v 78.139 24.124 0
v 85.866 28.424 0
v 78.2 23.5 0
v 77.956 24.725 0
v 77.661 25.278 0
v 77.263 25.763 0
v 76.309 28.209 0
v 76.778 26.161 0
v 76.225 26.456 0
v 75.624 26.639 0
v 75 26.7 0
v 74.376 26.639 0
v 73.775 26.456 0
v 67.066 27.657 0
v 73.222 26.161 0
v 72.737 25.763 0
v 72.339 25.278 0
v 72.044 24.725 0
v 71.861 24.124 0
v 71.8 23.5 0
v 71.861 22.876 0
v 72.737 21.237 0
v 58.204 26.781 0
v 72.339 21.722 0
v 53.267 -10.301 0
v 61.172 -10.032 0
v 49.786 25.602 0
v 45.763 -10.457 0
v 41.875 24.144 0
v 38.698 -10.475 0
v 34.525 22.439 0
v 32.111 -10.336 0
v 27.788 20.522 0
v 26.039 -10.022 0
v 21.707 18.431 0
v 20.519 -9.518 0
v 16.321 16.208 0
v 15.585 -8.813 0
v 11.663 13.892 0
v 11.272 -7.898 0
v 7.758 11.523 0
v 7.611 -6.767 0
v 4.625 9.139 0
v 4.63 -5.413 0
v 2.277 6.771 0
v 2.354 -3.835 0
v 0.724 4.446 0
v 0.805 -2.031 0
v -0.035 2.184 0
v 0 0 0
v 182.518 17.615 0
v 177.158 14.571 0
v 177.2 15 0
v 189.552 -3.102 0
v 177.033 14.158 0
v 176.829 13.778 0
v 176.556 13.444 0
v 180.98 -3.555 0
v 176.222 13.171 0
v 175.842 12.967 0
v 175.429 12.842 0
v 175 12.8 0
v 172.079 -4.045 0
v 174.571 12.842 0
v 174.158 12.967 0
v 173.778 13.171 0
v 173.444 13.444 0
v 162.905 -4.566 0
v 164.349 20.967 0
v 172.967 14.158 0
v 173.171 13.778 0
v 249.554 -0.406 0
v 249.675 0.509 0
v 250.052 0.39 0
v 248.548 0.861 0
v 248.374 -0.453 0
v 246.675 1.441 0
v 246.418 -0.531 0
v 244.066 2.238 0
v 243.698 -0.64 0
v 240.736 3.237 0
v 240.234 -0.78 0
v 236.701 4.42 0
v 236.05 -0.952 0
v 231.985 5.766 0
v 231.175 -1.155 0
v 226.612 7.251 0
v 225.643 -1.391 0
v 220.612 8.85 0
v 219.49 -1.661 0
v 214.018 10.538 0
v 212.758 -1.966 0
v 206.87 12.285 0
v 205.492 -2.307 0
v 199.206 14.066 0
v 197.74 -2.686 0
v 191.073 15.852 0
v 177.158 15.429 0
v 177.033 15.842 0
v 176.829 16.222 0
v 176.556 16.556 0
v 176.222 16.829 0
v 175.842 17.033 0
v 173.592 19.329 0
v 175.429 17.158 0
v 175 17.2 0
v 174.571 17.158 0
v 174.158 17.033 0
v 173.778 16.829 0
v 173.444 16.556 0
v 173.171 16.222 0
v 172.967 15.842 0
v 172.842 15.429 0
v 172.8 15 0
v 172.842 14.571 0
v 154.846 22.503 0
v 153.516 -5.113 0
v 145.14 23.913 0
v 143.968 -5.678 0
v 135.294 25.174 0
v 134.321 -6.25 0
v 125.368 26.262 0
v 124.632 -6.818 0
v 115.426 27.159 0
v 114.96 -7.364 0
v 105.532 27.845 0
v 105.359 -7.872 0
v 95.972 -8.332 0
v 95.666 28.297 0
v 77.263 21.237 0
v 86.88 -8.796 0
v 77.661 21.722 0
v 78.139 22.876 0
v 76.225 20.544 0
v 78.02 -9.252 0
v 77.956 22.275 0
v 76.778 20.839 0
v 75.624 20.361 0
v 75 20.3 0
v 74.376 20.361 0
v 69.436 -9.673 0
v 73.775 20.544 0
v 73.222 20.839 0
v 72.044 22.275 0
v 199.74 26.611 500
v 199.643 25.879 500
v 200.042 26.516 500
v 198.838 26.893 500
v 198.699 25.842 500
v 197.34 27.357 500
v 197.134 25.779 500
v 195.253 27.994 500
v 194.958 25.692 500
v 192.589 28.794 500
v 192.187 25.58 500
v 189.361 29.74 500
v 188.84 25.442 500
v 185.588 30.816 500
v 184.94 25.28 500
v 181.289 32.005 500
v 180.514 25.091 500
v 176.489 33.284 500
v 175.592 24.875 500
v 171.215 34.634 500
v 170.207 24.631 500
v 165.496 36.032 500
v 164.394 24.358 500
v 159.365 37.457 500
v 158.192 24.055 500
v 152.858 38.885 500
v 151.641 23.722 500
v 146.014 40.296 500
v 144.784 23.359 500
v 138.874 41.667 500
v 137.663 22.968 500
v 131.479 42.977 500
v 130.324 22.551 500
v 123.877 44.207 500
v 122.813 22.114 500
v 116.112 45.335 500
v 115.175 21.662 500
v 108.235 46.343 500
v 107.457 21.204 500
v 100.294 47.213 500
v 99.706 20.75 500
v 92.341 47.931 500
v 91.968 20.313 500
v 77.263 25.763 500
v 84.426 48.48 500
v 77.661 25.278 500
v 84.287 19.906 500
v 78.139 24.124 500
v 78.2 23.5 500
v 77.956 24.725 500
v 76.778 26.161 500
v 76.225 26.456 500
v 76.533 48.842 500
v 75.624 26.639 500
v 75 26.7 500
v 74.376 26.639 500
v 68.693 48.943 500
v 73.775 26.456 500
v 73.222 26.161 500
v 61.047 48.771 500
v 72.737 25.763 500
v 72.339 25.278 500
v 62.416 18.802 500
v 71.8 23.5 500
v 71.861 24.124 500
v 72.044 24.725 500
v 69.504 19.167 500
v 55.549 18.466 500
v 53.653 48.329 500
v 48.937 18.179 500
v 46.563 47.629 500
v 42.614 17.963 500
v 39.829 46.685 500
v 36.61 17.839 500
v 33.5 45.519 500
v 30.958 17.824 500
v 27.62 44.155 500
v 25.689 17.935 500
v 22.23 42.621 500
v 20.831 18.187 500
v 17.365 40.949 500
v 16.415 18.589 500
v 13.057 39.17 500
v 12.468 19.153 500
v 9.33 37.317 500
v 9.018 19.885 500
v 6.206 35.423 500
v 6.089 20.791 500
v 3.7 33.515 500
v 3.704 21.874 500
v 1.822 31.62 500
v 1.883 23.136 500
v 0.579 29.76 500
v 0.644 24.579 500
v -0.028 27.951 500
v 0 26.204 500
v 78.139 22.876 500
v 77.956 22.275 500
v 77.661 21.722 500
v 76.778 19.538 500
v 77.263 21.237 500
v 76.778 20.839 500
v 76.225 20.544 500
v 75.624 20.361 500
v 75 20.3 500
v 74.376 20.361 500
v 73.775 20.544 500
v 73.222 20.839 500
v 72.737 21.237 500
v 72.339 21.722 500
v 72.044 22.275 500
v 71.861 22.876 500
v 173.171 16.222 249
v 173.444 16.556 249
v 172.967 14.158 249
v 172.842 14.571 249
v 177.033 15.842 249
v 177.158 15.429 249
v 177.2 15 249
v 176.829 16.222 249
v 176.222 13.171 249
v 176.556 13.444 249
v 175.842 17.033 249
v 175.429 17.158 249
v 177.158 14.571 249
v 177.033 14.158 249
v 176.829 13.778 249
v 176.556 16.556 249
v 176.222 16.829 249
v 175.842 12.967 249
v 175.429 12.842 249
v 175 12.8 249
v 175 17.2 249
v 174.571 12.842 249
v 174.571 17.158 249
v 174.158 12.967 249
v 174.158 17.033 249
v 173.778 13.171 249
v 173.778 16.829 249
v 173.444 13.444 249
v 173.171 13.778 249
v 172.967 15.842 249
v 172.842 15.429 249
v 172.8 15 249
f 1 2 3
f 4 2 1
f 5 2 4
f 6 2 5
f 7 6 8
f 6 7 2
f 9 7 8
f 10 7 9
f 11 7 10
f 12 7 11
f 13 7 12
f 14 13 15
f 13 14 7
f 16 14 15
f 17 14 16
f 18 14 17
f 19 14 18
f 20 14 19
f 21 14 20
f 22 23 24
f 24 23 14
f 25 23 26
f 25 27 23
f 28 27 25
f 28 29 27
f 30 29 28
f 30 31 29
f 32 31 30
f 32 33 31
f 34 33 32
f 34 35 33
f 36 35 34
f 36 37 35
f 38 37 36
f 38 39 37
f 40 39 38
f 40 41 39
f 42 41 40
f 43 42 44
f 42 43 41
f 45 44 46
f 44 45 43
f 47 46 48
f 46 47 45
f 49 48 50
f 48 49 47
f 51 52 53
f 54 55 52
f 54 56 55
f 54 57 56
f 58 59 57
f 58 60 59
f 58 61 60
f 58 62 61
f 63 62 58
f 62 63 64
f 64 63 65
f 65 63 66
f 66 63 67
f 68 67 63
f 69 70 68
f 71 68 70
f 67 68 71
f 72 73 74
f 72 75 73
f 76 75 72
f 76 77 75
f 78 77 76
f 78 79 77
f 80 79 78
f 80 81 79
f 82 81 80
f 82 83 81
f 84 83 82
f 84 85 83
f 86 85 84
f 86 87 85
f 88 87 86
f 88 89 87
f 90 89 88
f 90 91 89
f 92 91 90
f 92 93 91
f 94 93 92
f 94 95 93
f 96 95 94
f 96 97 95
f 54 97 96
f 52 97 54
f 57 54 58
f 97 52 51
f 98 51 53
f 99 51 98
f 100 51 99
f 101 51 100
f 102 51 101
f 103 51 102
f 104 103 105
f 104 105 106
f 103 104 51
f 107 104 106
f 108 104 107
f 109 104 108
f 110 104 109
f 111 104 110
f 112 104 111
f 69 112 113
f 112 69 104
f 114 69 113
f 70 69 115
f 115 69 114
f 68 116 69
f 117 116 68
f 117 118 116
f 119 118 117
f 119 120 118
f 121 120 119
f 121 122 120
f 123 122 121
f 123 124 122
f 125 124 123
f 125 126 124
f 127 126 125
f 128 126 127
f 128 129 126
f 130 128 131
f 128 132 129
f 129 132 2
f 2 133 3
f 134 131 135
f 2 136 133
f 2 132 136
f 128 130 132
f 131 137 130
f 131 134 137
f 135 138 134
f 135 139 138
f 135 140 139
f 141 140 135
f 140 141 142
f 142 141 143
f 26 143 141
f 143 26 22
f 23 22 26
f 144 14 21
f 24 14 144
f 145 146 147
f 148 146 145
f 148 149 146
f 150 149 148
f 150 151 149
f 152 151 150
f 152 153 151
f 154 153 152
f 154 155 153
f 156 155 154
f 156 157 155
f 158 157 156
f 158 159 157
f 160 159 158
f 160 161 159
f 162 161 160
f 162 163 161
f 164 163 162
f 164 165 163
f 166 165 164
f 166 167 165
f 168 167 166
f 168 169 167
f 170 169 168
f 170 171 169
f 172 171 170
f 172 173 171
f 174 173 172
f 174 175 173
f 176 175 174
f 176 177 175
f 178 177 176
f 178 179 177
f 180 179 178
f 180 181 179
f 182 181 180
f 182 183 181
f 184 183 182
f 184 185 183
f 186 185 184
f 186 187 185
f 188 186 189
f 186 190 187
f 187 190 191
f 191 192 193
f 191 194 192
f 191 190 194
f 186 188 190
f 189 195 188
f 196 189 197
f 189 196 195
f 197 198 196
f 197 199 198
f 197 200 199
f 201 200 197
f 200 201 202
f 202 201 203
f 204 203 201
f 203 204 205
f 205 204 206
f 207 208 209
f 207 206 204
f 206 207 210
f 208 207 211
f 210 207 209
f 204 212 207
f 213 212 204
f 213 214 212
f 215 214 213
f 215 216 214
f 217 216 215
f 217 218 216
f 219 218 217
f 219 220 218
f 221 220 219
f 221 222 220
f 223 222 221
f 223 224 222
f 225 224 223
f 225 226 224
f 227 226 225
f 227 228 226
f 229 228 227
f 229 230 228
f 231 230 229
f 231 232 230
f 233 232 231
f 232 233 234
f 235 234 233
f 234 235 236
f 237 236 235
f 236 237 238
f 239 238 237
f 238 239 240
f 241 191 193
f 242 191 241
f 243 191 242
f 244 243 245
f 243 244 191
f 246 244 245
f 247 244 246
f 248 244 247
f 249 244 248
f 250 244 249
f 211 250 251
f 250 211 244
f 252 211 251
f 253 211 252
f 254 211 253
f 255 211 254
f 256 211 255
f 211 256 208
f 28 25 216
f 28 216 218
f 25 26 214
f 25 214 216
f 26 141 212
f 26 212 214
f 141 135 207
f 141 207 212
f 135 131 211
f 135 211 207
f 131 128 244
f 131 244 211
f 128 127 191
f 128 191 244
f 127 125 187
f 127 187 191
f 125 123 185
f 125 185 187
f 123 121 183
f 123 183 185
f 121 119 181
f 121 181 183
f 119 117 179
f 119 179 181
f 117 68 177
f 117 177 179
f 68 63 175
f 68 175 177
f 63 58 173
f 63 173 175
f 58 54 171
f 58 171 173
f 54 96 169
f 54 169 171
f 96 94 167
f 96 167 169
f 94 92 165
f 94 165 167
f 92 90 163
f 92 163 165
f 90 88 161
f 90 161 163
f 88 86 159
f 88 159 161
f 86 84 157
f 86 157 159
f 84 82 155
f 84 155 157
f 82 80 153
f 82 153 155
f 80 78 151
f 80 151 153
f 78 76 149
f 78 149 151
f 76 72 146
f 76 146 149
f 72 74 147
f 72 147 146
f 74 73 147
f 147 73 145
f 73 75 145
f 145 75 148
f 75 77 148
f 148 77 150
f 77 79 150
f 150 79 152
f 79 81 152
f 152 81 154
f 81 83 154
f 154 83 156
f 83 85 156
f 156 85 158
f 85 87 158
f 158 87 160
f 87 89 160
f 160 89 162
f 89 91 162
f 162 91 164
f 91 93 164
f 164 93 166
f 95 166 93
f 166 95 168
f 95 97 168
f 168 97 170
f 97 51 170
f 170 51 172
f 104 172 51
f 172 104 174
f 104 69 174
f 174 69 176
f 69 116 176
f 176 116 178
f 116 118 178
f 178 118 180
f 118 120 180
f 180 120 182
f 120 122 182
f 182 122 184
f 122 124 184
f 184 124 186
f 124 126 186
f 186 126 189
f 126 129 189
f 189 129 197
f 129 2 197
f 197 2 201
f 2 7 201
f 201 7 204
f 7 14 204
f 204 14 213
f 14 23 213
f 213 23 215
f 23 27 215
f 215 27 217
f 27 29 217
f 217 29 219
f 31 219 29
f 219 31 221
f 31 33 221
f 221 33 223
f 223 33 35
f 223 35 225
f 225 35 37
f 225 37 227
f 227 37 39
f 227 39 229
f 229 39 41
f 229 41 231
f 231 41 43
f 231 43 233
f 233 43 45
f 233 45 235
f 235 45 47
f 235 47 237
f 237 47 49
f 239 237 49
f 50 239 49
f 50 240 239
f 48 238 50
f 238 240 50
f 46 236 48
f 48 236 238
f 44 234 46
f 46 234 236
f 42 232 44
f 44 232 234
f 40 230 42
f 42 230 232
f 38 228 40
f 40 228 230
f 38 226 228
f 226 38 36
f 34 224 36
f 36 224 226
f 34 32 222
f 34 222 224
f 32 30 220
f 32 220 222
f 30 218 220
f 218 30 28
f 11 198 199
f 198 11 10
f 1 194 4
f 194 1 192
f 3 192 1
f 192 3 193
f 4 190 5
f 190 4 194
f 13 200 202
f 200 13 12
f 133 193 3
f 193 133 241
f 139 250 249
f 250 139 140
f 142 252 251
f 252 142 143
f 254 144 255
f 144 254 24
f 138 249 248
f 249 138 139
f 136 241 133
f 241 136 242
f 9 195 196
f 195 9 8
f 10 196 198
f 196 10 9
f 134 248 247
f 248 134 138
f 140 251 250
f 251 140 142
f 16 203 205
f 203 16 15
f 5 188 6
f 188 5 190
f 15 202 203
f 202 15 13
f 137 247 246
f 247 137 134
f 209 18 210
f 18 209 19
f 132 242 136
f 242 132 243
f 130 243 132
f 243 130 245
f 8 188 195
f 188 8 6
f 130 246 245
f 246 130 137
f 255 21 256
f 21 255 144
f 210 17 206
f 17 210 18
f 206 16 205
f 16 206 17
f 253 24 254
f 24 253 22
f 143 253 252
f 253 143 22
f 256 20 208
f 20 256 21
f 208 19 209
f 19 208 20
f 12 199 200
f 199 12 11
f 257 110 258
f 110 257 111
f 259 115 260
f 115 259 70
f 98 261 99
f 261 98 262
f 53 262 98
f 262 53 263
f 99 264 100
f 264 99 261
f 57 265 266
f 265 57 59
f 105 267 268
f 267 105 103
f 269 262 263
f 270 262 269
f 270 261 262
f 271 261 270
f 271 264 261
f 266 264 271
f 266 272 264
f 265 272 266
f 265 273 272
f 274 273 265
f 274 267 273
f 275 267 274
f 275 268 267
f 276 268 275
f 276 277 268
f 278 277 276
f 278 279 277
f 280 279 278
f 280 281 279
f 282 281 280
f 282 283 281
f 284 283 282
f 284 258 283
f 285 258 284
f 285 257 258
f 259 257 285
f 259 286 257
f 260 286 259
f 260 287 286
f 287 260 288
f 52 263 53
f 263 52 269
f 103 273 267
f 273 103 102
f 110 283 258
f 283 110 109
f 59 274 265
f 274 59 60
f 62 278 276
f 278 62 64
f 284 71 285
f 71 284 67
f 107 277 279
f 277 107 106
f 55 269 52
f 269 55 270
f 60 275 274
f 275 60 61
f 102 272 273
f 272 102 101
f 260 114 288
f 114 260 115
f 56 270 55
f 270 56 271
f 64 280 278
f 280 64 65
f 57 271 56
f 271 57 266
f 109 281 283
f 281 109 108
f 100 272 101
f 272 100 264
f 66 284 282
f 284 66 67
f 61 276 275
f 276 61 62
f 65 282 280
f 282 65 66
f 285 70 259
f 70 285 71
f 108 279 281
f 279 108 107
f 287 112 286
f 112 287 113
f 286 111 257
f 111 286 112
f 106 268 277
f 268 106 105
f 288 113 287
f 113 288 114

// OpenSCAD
// file: ../../lib/airfoil.scad
// airfoil.scad – NACA 4-digit airfoil profile generator
// Generates 2D airfoil profiles for use in wing construction
// Units: mm

// Generate a NACA 4-digit airfoil as a list of [x,y] points
// Parameters:
//   naca  - 4-digit NACA code as vector [m, p, tt]
//           m  = max camber (% chord / 100)
//           p  = position of max camber (tenths of chord / 10)
//           tt = max thickness (% chord / 100)
//   chord - chord length in mm
//   n     - number of points per side (more = smoother)
//
// Example: NACA 2412 → naca=[0.02, 0.4, 0.12]

function naca_half_thickness(tt, x) =
    5 * tt * (
        0.2969 * sqrt(x)
        - 0.1260 * x
        - 0.3516 * pow(x, 2)
        + 0.2843 * pow(x, 3)
        - 0.1015 * pow(x, 4)
    );

function naca_camber(m, p, x) =
    (x < p)
        ? (m / pow(p, 2)) * (2 * p * x - pow(x, 2))
        : (m / pow(1 - p, 2)) * ((1 - 2 * p) + 2 * p * x - pow(x, 2));

function naca_camber_gradient(m, p, x) =
    (x < p)
        ? (2 * m / pow(p, 2)) * (p - x)
        : (2 * m / pow(1 - p, 2)) * (p - x);

// Generate airfoil points (upper + lower surface, closed polygon)
function naca_points(naca, chord, n = 40) =
    let(
        m  = naca[0],
        p  = max(naca[1], 0.001),  // avoid division by zero
        tt = naca[2],
        // Cosine spacing for better leading edge resolution
        xs = [for (i = [0:n]) 0.5 * (1 - cos(i * 180 / n))],
        upper = [for (i = [0:n])
            let(
                x  = xs[i],
                yt = naca_half_thickness(tt, x),
                yc = naca_camber(m, p, x),
                theta = atan2(naca_camber_gradient(m, p, x), 1)
            )
            [chord * (x - yt * sin(theta)),
             chord * (yc + yt * cos(theta))]
        ],
        lower = [for (i = [n:-1:0])
            let(
                x  = xs[i],
                yt = naca_half_thickness(tt, x),
                yc = naca_camber(m, p, x),
                theta = atan2(naca_camber_gradient(m, p, x), 1)
            )
            [chord * (x + yt * sin(theta)),
             chord * (yc - yt * cos(theta))]
        ]
    )
    concat(upper, [for (i = [1:len(lower)-2]) lower[i]]);

// 2D airfoil shape as polygon
module airfoil_2d(naca, chord, n = 40) {
    polygon(points = naca_points(naca, chord, n));
}

// Common NACA profiles as convenience constants
// Format: [max_camber, camber_position, thickness]
NACA_2412 = [0.02, 0.4, 0.12];  // Classic general aviation
NACA_4412 = [0.04, 0.4, 0.12];  // Higher lift, good for slow flight
NACA_4415 = [0.04, 0.4, 0.15];  // Thicker, more lift at low speed
NACA_2415 = [0.02, 0.4, 0.15];  // Moderate camber, thick
NACA_0012 = [0.00, 0.0, 0.12];  // Symmetric (for tail surfaces)
NACA_0009 = [0.00, 0.0, 0.09];  // Symmetric, thin (tail)
NACA_23012 = [0.02, 0.3, 0.12]; // Approximation for 5-digit
// main file
// wing.scad – Flügel für den Baron
// Linker Halbflügel, senkrecht stehend (Vase-Mode Druck)
// Profil unten = Wurzel, oben = Spitze
// V-Form: 3.5° nach außen geneigt

use <../../lib/airfoil.scad>

wing_naca       = [0.04, 0.4, 0.15];  // NACA 4415
chord_root      = 250;                 // [mm] Wurzeltiefe
chord_tip       = 200;                 // [mm] Spitze (20 cm)
half_span       = 500;                 // [mm] Halbspannweite
v_angle         = 3.0;                 // [°] V-Form pro Seite (7° total)

// Holm-Parameter
spar_d          = 6;                   // [mm] Carbonrohr Hauptholm
spar_pos        = 0.30;               // 30% Flügeltiefe
spar_len        = 505;                  // Holm Länge
span_hight_pos  = 23.5;                 // Lages des Holm über der Profilsehene an der Wurzelrippe
rear_spar_d     = 4;                   // [mm] hinterer Holm
rear_spar_pos   = 0.70;               // 70% Flügeltiefe
rear_spar_len   = 250;                // [mm] hinterer Holm kürzer

$fn = $preview ? 32 : 128;

// Profilhöhe bei 30% Tiefe (NACA 4415): ca. 37.5 mm bei 250er Chord
// Holm läuft schräg: oben-innen nach unten-außen
spar_z_root     = chord_root * 0.10;   // [mm] Holm-Höhe an Wurzel (obere Hälfte)
spar_z_tip      = -chord_tip * 0.03;   // [mm] Holm-Höhe an Spitze (nahe Unterseite)

module half_wing() {
    difference() {
        // Flügel mit V-Form: schräger Extrude via Scherung
        // Wurzel bleibt flach bei Z=0, Spitze wandert um tan(3.5°)*500 ≈ 30.6mm in Y
        multmatrix([
            [1, 0, 0,            0],
            [0, 1, tan(v_angle), 0],
            [0, 0, 1,            0]
        ])
        linear_extrude(height = half_span, scale = chord_tip / chord_root)
            airfoil_2d(wing_naca, chord_root);

        // Hauptholm-Kanal (senkrecht, gerade nach oben)
        translate([chord_root * spar_pos, span_hight_pos, -1])
            cylinder(d = spar_d + 0.4, h = spar_len , $fn = 32);

        // Hinterer Holm-Kanal (senkrecht, kürzer)
        translate([chord_root * rear_spar_pos, 15, -1])
            cylinder(d = rear_spar_d + 0.4, h = rear_spar_len , $fn = 32);
    }
}

half_wing();
